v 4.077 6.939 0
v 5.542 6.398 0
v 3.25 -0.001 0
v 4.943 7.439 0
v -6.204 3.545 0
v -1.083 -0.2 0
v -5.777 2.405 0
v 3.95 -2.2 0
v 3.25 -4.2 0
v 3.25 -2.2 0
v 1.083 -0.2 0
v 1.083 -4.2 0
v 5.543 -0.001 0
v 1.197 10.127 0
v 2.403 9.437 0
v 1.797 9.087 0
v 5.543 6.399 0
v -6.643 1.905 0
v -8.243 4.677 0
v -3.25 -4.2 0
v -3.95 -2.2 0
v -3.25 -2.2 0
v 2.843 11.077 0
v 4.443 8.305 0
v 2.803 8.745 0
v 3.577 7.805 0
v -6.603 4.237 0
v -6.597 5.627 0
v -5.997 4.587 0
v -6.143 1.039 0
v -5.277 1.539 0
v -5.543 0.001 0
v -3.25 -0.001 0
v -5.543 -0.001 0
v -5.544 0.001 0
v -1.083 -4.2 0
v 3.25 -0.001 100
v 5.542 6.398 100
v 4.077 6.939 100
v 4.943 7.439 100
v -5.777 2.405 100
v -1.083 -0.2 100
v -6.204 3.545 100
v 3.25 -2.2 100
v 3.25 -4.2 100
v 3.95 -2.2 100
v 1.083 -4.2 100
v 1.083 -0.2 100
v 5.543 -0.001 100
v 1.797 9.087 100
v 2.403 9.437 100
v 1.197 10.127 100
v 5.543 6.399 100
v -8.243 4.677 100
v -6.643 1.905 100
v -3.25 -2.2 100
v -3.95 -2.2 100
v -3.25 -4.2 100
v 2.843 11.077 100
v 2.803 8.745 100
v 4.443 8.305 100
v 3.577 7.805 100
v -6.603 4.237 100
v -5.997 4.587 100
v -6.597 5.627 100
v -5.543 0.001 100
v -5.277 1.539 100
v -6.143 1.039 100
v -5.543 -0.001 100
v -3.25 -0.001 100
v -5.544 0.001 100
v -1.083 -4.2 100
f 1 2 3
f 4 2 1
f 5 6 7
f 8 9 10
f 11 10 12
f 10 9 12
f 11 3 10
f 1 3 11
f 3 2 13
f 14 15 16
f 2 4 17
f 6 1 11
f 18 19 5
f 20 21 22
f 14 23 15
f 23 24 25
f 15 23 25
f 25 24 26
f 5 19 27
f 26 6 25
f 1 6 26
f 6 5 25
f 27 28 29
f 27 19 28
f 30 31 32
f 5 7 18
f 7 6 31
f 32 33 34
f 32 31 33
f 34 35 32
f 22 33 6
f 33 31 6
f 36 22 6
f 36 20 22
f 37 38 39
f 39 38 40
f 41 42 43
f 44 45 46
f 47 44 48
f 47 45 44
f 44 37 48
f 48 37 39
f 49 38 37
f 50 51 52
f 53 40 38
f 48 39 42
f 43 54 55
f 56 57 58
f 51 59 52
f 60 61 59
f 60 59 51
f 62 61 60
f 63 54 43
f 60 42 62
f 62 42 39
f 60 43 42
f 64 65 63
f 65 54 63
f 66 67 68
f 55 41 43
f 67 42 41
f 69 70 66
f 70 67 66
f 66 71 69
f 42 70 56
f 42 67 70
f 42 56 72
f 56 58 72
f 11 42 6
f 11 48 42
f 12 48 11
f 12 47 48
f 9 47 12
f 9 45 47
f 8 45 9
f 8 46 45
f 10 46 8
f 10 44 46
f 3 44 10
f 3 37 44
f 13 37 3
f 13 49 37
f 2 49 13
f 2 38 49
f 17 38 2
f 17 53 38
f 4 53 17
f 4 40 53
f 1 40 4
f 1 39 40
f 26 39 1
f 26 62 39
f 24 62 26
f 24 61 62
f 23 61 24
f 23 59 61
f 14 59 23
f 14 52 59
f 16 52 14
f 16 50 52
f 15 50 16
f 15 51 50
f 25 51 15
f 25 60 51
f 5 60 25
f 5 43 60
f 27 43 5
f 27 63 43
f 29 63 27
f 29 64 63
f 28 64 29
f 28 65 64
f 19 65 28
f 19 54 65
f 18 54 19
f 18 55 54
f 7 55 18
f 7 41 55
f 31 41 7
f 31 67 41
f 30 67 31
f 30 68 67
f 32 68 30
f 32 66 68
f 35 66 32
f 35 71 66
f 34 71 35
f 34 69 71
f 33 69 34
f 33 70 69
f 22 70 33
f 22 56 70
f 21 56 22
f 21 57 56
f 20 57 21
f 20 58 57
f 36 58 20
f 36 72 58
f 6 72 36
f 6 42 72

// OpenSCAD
part="rail"; // [diffusor,rail,demo]

height=100; // [0:1000]
hollow="no"; // [yes,no]
rail_wall=0.8; // [0:0.05:10]

strip_width=10.0; // [0:0.1:50]
strip_clearence=0.2; // [0:0.05:2]
strip_border_height=2.0; // [0:0.05:10]
strip_border_width=1.2; // [0:0.05:10]
strip_hook_width=0.7; // [0:0.05:10]
strip_thickness=0.8; // [0:0.05:10]

profile_slot_width=6.2; // [0:0.1:50]
profile_thickness=2.0; // [0:0.1:50]
profile_tooth_edge=0.7; // [0:0.1:50]
profile_tooth_depth=2.0; // [0:0.1:50]
profile_slot_pressure=0.3; // [0:0.1:50]
profile_clearence=0.2; // [0:0.05:2]
profile_edge_min_width=2.0; // [0:0.1:50]

enable_diffusor="yes"; // [yes,no]
diffusor_wall=0.8; // [0:0.05:100]
diffusor_slot_depth=1.0; // [0:0.05:10]
diffusor_holder_wall=1.2; // [0:0.05:10]
diffusor_pressure=0.3; // [0:0.05:10]
diffusor_clearence=0.1; // [0:0.05:10]

angle=30; // [0:360]
offset_x=0.0; // [0:100]
offset_y=0.0; // [0:100]

$fn=32;

//!profile_teeth_shape();
module profile_teeth_shape() {
    r1=1;

    x1=(profile_slot_width+profile_slot_pressure)/2;
    y2=profile_thickness+profile_clearence;
    x3=x1+profile_tooth_edge;
    y4=y2+profile_tooth_depth;
    x5=x1/3;
    y6=y2-2;

    intersection()
    {
        polygon([
            [-x1,0.001],
            [-x1,-y2],
            [-x3,-y2],
            [-x1,-y4],
            [-x5,-y4],
            [-x5,-y6],
    
            [x5,-y6],
            [x5,-y4],
            [x1,-y4],
            [x3,-y2],
            [x1,-y2],
            [x1,0.001]
        ]);
/*
        offset(r1)
            offset(-r1)
                polygon([
                    [-x3-r1,0.001+r1],
                    [-x3-r1,-y4+r1],
                    [-x3,-y2],
                    [-x4,-y4],
                    [-x5,-y4],
                    [-0.5,-y6],
            
                    [0.5,-y6],
                    [x5,-y4],
                    [x4,-y4],
                    [x3,-y2],
                    [x3+r1,-y4+r1],
                    [x3+r1,0.001+r1],
                ]);
*/
    }
}

rail_width=strip_width+2*strip_clearence+2*strip_border_width;
rail_base_width=max(rail_width*cos(angle),profile_slot_width+profile_slot_pressure+2*profile_edge_min_width);

module strip_holder_shape() {
    x1=rail_width/2-strip_border_width;
    y2=strip_thickness;
    x3=x1-strip_hook_width;
    y4=strip_border_height;
    x5=rail_width/2;

    polygon([
        [-x1,0.001],
        [-x1,y2],
        [-x3,y2],
        [-x3,y4],
        [-x5,y4],
        [-x5,-0.001],

        [x5,-0.001],
        [x5,y4],
        [x3,y4],
        [x3,y2],
        [x1,y2],
        [x1,0.001],
    ]);
}

diffusor_holder_height=2*diffusor_holder_wall+diffusor_wall+2*diffusor_clearence;
module diffusor_holder_shape() {
    x1=rail_width/2;
    y2=diffusor_holder_wall;
    x3=x1-diffusor_slot_depth;
    y4=diffusor_holder_height-diffusor_holder_wall;
    y6=diffusor_holder_height;

    polygon([
        [x1,-0.001],
        [x1,y2],
        [x3,y2],
        [x3,y4],
        [x1,y4],
        [x1,y6+0.001],

        [-x1,y6+0.001],
        [-x1,y4],
        [-x3,y4],
        [-x3,y2],
        [-x1,y2],
        [-x1,-0.001]
    ]);
}

diffusor_placeholder_height=2*rail_wall;
module diffusor_placeholder_shape() {
    x1=rail_width/2;
    y6=diffusor_placeholder_height;

    polygon([
        [x1,-0.001],
        [x1,y6+0.001],

        [-x1,y6+0.001],
        [-x1,-0.001]
    ]);
}

module rail_base_shape() {
    x1=rail_width/2;
    x2=rail_base_width-x1;
    x4=rail_width*cos(angle)-x1;
    y4=rail_width*sin(angle);

    polygon([
        [-x1+offset_x-0.001,offset_y+0.001],
        [-x1,-0.001],
        [x2,-0.001],
        [x2,min(offset_y,1)],
        [x4+offset_x-0.001,y4+offset_y+0.001]
    ]);
}

module rail_shape() {
    translate([rail_width/2-rail_base_width/2,0]) {
        translate([-rail_width/2+offset_x,offset_y]) {
            rotate(angle) {
                translate([rail_width/2,0]) {
                    if (enable_diffusor == "yes") {
                        translate([0,diffusor_holder_height])
                            strip_holder_shape();
                        diffusor_holder_shape();
                    } else {
                        translate([0,diffusor_placeholder_height])
                            strip_holder_shape();
                        diffusor_placeholder_shape();
                    }
                }
            }
        }
        
        rail_base_shape();
    }
    
    profile_teeth_shape();
}

module diffusor_inner_shape() {
    x1=rail_width/2;
    y1=diffusor_holder_height-diffusor_holder_wall-diffusor_clearence;
    y2=diffusor_holder_height+strip_border_height+0.5;

    translate([0,y2]) {
        intersection() {
            scale([1,0.3]) circle(r=x1);
            translate([-x1,0])
                square([2*x1,x1]);
        }
    }
    translate([-x1,y1])
        square([2*x1,y2-y1+0.001]);
}

module diffusor_shape() {
    difference()  {
        offset(diffusor_wall)
            diffusor_inner_shape();

        diffusor_inner_shape();
        translate([-(rail_width/2-diffusor_slot_depth-diffusor_pressure),diffusor_holder_wall+diffusor_clearence-0.001])
            square([rail_width-2*diffusor_slot_depth-2*diffusor_pressure,diffusor_wall+0.002]);
    }
}

module diffusor() {
    if (height>0)
        linear_extrude(height=height)
            diffusor_shape();
    else
        diffusor_shape();
}

module rail() {
    if (height>0) {
        linear_extrude(height=height) {
            difference() {
                rail_shape();
                if (hollow=="yes")
                    offset(-rail_wall)
                        rail_shape();
            }
        }
    } else {
        difference() {
            rail_shape();
            if (hollow=="yes")
                offset(-rail_wall)
                    rail_shape();
        }
    }
}

module demo() {
    color("gray")
        rail();
    color("white",0.4) {
        translate([rail_width/2-rail_base_width/2+offset_x,offset_y]) {
            translate([-rail_width/2,0]) {
                rotate(angle) {
                    translate([rail_width/2,0]) {
                        diffusor();
                    }
                }
            }
        }
    }
}

if (part=="diffusor")
    diffusor();
else if (part=="rail")
    rail();
else if (part=="demo")
    demo();
